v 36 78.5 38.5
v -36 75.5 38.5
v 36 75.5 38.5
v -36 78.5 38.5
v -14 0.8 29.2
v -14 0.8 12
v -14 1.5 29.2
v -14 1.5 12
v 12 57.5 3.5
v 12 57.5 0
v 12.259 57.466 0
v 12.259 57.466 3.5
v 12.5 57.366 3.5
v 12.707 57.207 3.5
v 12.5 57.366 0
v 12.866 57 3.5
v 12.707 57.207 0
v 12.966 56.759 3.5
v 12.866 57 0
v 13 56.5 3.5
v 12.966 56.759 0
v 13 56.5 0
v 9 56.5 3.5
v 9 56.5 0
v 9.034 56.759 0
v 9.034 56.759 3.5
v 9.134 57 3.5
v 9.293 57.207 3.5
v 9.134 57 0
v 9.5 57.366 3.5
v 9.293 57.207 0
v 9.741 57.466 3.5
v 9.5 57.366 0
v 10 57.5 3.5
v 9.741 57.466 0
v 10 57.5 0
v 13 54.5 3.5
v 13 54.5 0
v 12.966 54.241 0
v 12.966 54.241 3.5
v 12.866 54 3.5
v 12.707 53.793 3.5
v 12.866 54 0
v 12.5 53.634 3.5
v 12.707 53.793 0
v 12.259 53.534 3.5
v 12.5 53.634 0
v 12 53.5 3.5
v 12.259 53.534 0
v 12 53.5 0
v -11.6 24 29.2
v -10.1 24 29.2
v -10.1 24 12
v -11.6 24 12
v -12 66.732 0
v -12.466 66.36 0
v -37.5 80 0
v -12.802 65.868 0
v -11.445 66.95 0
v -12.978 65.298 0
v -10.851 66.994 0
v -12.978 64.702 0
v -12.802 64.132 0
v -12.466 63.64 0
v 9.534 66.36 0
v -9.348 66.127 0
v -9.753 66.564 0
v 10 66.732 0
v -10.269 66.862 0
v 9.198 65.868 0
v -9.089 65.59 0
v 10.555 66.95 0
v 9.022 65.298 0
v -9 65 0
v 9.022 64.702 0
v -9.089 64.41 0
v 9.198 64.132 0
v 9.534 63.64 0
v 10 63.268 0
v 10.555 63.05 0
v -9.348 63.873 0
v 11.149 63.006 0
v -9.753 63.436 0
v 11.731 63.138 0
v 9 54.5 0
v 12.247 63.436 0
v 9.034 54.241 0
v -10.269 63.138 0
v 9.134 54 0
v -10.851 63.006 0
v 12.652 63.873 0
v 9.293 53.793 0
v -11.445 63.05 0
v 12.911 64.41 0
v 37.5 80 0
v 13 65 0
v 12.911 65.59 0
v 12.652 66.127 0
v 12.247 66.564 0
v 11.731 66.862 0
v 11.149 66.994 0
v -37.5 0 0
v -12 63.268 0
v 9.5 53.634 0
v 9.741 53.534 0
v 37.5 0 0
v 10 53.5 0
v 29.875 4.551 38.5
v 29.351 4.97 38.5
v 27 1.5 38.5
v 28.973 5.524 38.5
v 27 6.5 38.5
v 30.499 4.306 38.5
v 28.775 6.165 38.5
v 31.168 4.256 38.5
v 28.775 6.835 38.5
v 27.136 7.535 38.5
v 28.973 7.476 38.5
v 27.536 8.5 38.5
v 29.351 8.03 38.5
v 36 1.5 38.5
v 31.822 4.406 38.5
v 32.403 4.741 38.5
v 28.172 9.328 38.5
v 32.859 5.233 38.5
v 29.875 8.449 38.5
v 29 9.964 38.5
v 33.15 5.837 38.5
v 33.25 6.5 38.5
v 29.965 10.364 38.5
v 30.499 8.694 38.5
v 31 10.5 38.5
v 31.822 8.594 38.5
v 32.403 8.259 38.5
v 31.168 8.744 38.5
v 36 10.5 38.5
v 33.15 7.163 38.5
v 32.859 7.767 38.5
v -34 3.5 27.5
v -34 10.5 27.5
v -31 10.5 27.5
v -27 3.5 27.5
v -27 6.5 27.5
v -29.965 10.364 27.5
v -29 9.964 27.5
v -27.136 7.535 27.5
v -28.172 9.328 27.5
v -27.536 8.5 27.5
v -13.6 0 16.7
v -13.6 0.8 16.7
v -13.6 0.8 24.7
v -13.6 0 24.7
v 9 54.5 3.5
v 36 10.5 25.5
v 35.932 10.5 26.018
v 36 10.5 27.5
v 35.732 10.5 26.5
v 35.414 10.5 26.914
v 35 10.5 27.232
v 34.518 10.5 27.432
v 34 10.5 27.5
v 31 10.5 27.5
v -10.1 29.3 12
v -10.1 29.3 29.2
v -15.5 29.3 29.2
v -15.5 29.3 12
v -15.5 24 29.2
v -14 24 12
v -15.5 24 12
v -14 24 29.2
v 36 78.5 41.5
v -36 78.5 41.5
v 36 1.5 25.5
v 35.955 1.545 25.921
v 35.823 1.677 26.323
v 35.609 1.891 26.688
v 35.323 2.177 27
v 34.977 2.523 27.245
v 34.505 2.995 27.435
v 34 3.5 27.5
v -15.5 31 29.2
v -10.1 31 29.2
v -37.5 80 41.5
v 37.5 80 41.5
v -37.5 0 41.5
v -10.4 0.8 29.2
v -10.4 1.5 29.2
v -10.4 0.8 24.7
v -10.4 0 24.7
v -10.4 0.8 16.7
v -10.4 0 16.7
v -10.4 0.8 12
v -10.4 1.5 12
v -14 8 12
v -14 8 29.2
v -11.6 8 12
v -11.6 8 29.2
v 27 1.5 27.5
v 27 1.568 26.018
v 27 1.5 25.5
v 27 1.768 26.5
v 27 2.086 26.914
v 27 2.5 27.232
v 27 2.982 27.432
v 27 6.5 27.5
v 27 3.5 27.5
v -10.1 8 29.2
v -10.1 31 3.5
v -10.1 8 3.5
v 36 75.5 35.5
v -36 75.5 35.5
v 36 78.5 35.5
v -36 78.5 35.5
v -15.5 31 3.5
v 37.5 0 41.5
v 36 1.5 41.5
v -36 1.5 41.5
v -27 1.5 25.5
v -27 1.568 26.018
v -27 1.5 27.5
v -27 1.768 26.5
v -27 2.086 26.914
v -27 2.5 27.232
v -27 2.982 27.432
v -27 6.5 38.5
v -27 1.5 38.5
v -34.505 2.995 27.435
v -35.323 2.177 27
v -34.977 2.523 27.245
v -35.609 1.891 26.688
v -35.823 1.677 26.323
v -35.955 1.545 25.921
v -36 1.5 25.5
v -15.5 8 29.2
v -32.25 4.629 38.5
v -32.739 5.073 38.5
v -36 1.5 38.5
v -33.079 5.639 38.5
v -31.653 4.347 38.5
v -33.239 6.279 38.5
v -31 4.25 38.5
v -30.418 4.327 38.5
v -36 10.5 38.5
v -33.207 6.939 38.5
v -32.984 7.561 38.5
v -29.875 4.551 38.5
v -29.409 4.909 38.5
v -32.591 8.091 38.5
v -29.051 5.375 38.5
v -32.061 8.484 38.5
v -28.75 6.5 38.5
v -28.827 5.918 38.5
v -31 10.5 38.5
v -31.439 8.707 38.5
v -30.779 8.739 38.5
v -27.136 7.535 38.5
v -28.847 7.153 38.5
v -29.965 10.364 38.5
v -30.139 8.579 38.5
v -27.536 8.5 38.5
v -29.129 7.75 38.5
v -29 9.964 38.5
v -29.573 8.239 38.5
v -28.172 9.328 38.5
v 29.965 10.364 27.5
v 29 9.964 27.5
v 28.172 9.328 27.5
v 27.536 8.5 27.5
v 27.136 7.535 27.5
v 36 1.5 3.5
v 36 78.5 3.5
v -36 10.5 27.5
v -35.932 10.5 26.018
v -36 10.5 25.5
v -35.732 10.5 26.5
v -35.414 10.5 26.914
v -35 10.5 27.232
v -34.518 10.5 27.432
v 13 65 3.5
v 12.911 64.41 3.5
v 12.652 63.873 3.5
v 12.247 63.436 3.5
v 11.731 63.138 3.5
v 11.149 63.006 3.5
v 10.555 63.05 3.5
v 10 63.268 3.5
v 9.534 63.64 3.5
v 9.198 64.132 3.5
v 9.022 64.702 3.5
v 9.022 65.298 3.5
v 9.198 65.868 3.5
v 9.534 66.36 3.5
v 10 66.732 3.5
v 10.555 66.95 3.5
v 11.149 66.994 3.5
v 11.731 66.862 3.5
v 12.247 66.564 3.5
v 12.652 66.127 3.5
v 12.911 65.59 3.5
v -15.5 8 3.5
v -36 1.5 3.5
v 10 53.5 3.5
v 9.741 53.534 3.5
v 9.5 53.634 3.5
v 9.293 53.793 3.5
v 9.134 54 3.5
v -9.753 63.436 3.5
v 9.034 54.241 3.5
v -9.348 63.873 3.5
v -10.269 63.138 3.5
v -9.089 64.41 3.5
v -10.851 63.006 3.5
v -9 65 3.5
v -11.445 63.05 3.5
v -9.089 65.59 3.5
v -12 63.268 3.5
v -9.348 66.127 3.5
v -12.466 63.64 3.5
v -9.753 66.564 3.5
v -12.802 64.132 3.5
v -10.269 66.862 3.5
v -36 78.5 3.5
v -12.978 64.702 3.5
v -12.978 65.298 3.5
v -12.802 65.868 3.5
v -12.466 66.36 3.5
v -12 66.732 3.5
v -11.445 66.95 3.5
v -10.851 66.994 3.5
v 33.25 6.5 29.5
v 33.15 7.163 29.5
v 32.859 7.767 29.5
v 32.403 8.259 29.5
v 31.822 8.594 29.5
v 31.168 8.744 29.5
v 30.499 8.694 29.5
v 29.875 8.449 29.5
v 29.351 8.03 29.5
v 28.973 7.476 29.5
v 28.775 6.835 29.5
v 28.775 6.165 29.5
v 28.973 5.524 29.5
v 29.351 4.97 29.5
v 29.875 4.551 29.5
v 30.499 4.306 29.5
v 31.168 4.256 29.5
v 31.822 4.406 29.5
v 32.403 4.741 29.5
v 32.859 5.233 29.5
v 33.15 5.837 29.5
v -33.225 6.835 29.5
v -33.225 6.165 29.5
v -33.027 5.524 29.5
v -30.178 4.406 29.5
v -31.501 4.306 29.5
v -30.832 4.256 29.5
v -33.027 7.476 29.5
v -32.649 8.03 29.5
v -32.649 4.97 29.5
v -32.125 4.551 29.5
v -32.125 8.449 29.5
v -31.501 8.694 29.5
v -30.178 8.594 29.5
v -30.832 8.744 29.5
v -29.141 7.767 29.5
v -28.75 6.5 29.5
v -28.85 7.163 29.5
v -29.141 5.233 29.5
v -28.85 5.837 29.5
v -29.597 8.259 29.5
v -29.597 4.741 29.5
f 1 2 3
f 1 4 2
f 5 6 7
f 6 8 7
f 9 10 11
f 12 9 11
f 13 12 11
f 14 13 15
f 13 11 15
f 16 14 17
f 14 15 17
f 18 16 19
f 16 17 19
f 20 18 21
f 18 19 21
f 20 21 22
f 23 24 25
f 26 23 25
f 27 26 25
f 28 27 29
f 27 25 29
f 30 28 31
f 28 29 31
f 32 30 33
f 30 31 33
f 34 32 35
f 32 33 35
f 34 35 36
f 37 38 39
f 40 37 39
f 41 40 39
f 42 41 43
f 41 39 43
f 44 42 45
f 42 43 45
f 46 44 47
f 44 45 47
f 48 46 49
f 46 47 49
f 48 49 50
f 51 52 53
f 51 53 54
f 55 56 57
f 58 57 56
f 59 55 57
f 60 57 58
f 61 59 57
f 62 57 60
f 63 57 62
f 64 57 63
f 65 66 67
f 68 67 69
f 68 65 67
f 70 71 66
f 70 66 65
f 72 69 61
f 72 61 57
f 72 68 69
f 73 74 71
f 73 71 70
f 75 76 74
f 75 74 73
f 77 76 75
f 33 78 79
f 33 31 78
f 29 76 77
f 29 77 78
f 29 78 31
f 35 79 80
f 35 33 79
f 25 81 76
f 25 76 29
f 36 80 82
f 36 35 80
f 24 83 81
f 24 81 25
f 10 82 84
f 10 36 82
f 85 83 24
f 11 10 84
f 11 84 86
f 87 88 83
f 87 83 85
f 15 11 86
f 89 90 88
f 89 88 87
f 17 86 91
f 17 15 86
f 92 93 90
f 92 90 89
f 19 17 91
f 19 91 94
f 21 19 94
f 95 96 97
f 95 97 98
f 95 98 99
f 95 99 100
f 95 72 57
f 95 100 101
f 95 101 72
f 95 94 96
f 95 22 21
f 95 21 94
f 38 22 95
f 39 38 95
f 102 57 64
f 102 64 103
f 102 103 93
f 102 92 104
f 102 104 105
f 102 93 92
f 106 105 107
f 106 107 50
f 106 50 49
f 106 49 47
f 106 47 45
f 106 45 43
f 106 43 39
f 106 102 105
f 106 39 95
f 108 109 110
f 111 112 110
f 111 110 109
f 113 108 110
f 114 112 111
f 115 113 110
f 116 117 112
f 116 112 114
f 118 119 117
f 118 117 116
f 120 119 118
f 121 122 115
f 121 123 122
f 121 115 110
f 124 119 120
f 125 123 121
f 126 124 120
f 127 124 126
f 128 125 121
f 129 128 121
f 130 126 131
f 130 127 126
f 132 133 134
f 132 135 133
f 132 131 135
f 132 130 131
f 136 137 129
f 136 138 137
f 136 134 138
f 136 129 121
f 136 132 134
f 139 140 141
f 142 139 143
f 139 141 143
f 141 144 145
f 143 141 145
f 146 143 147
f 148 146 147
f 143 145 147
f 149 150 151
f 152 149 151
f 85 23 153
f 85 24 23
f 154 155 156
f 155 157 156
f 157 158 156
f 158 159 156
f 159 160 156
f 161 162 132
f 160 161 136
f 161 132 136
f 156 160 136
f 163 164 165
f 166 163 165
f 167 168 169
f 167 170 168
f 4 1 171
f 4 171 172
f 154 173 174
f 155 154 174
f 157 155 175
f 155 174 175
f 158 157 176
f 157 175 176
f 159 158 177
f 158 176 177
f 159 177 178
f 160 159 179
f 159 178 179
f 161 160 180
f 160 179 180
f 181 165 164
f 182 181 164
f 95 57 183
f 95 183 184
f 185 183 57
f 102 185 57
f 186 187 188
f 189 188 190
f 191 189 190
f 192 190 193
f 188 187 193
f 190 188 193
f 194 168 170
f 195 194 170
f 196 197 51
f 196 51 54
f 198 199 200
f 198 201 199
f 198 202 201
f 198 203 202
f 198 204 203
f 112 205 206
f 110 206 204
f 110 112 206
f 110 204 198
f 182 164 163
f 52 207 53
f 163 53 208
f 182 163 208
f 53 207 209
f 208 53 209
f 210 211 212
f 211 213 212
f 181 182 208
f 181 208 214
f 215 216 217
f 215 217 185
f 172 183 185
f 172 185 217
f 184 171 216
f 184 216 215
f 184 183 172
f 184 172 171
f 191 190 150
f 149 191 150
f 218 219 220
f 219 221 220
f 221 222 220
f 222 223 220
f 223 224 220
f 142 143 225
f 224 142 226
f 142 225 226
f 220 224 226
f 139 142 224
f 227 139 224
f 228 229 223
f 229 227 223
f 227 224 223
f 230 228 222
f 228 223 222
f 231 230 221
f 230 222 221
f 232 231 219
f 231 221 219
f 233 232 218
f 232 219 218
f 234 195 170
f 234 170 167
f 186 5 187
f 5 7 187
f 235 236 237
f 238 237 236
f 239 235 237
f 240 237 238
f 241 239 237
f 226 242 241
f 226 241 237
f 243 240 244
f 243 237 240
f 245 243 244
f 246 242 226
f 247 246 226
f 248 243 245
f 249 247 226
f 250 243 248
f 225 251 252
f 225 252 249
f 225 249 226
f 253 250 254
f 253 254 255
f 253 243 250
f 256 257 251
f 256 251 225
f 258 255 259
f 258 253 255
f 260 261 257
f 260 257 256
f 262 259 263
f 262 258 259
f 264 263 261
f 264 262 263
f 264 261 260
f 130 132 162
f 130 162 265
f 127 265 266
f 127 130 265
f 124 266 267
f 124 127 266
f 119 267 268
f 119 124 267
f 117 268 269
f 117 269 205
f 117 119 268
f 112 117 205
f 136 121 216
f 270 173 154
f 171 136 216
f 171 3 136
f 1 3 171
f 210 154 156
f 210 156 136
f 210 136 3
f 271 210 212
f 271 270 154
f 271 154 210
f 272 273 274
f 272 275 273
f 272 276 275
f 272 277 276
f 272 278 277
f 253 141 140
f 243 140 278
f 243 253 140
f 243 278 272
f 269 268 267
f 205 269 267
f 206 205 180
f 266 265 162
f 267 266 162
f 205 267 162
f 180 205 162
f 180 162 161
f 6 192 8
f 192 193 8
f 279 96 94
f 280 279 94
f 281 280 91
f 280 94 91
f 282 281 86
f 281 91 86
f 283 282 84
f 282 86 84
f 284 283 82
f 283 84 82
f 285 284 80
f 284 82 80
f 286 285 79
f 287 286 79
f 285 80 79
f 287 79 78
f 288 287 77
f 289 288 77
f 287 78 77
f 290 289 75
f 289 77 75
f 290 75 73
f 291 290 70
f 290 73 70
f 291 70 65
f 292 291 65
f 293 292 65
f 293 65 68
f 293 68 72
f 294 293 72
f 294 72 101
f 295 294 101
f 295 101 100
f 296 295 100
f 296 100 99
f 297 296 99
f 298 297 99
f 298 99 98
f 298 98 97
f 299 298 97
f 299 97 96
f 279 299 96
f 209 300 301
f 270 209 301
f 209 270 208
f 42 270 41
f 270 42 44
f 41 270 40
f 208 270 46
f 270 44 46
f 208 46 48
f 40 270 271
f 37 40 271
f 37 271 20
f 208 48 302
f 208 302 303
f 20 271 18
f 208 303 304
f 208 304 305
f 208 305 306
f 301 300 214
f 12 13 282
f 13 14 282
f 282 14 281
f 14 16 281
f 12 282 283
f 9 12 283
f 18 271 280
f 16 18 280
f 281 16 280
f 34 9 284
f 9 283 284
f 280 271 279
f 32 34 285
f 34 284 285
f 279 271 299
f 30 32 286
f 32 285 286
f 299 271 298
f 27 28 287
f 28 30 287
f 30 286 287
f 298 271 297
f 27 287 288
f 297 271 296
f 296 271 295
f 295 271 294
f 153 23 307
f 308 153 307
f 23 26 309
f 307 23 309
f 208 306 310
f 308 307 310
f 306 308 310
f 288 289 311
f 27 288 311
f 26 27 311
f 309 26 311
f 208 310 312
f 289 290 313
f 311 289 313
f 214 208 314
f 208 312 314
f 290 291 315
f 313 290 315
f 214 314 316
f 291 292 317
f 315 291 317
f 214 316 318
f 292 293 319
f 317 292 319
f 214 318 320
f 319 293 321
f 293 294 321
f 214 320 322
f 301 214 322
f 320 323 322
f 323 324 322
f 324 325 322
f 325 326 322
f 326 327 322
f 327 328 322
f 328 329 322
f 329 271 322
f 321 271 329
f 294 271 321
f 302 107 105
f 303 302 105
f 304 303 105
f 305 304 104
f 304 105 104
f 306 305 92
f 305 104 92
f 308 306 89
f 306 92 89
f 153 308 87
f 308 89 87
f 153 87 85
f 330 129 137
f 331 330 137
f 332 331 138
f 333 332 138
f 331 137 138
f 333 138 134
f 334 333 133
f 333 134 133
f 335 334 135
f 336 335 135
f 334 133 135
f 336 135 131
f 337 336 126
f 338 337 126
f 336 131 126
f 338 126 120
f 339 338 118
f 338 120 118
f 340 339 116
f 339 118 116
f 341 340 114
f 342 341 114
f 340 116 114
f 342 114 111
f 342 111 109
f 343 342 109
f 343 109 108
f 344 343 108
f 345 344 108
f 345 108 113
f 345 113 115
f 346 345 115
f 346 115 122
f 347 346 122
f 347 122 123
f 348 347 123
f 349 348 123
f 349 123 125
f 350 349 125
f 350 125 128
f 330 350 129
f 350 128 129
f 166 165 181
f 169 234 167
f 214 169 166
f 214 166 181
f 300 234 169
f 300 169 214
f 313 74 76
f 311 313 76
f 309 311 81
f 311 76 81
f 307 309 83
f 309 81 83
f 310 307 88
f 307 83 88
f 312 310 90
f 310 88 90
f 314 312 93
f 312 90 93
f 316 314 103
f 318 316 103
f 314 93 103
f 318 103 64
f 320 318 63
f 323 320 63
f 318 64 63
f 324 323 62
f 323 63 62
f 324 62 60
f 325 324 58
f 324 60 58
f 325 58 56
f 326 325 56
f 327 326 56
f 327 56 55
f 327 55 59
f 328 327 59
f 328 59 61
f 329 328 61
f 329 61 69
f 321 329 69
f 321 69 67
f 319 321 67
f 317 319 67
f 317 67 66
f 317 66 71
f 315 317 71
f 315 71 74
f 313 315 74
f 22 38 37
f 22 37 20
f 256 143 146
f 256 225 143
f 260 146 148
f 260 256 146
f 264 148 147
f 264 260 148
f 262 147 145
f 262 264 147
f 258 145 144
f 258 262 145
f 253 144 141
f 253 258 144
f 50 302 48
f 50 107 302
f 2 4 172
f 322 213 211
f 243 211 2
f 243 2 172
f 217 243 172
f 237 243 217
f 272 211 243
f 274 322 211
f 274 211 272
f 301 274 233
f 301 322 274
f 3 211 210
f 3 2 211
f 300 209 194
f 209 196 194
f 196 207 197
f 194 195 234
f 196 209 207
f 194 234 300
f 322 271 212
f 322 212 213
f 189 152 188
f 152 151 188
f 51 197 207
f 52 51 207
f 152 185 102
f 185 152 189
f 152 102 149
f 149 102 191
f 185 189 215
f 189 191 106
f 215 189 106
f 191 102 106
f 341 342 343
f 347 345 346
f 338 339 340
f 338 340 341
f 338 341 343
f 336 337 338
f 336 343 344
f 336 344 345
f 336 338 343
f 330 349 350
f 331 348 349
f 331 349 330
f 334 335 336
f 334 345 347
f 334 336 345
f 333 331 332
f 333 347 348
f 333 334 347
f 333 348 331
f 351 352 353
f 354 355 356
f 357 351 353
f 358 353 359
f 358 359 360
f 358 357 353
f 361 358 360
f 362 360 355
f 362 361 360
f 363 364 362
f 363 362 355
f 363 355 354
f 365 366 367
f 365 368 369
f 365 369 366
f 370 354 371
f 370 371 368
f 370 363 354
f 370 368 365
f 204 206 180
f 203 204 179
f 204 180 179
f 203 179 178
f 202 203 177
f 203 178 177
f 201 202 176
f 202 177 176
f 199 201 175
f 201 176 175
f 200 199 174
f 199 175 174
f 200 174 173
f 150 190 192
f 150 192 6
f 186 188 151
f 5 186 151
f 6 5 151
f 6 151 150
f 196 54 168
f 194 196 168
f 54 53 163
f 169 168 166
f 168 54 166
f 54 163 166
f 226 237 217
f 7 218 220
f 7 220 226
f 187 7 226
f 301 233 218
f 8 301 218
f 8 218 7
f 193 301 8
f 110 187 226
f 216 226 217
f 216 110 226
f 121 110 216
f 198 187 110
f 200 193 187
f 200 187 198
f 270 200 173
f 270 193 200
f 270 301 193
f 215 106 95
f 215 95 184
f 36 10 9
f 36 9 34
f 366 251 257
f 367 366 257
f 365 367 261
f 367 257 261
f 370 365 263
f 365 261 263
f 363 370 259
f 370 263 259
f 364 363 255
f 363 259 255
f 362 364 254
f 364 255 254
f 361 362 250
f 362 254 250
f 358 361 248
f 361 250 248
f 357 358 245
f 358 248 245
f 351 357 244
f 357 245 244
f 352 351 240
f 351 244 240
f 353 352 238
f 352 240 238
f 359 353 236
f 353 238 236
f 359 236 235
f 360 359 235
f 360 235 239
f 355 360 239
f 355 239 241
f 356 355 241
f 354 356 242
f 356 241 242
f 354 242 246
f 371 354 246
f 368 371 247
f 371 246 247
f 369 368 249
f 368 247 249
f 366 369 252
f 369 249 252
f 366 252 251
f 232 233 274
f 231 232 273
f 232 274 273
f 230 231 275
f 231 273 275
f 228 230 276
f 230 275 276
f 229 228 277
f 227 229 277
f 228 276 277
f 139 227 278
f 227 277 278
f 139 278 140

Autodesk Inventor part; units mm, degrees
sketch "Boceto1" plane through (0, 0, 0) normal (0, 1, 0) x (-1, 0, 0)
  line L0 (0, 0) -> (0, 0)
  line L1 (0, 0) -> (37.5, 0)
  line L2 (37.5, 0) -> (37.5, -1.5)
  line L3 (37.5, -1.5) -> (37.5, -3.5)
  line L4 (37.5, -3.5) -> (37.5, -2)
  line L5 (37.5, 0) -> (37.5, 0)
  line L6 (37.5, -3.5) -> (34, -3.5)
  line L7 (34, -3.5) -> (34, -2)
  line L8 (34, -2) -> (36, -2)
  line L9 (37.5, 0) -> (37.5, 0)
  line L10 (0, 0) -> (0, -10)
  line L11 (0, 0) -> (37.5, 0)
  line L12 (37.5, 0) -> (0, 0)
  line L13 (0, 0) -> (0, 0)
  line L14 (0, 0) -> (-37.5, 0)
  line L15 (-37.5, 0) -> (-37.5, -1.5)
  line L16 (-37.5, -1.5) -> (-37.5, -3.5)
  line L17 (-37.5, -3.5) -> (-37.5, -2)
  line L18 (-37.5, 0) -> (-37.5, 0)
  line L19 (-37.5, -3.5) -> (-34, -3.5)
  line L20 (-34, -3.5) -> (-34, -2)
  line L21 (-34, -2) -> (-36, -2)
  line L22 (-37.5, 0) -> (-37.5, 0)
  line L23 (0, 0) -> (-37.5, 0)
  line L24 (0, 0) -> (-37.5, 0)
  line L25 (37.5, 0) -> (-37.5, 0)
  line L26 (-37.5, 0) -> (-37.5, 2)
  line L27 (-37.5, 2) -> (37.5, 2)
  line L28 (37.5, 2) -> (37.5, 0)
  dimension "d0" = 0
  dimension "d1" = 37.5
  dimension "d3" = 1.5
  dimension "d4" = 2
  dimension "d5" = 1.5
  dimension "d6" = 3.5
  dimension "d7" = 2
  dimension "d8" = 0
  dimension "d9" = 10
  dimension "d31" = 2
extrude "Extrusión1" [suppressed]
sketch "Boceto2" plane through (0, 0, 0) normal (0, 0, 1) x (1, 0, 0)
  line L0 (0, 0) -> (-15, 0)
  line L1 (-15, 0) -> (-15, 62.7974)
  line L2 (-15, 62.7974) -> (-12.5, 62.7974)
  line L3 (-12.5, 62.7974) -> (-15, 60.2974)
  line L4 (-12.5, 62.7974) -> (-15, 64.2408)
  line L5 (-15, 62.7974) -> (-15, 64.2408)
  line L6 (-15, 62.7974) -> (-15, 82.1308)
  line L7 (-15, 82.1308) -> (-13, 85.5949)
  line L8 (-15, 82.1308) -> (-15, 85.5949)
  line L9 (-15, 85.5949) -> (0, 85.5949)
  line L10 (0, 85.5949) -> (0, 0)
  line L11 (-15, 62.7974) -> (-15, 43.4641)
  line L12 (-15, 43.4641) -> (-13, 40)
  line L13 (-13, 40) -> (-13, 0)
  line L14 (0, 0) -> (15, 0)
  line L15 (15, 0) -> (15, 62.7974)
  line L16 (15, 62.7974) -> (12.5, 62.7974)
  line L17 (12.5, 62.7974) -> (15, 60.2974)
  line L18 (12.5, 62.7974) -> (15, 64.2408)
  line L19 (15, 62.7974) -> (15, 64.2408)
  line L20 (15, 62.7974) -> (15, 82.1308)
  line L21 (15, 82.1308) -> (13, 85.5949)
  line L22 (15, 82.1308) -> (15, 85.5949)
  line L23 (15, 85.5949) -> (0, 85.5949)
  line L24 (15, 62.7974) -> (15, 43.4641)
  line L25 (15, 43.4641) -> (13, 40)
  line L26 (13, 40) -> (13, 0)
  dimension "d12" = 15
  dimension "d13" = 60
  dimension "d14" = 45
  dimension "d15" = 2.5
  dimension "d16" = 62.7974
  dimension "d17" = 15
  dimension "d18" = 30
  dimension "d19" = 19.3333
  dimension "d20" = 19.3333
  dimension "d21" = 150
  dimension "d22" = 2
  dimension "d24" = 2
extrude "Extrusión2" [suppressed]
extrude "Extrusión4" [suppressed]
extrude "Extrusión3" [suppressed]
extrude "Extrusión5" add sketch "Boceto1" along normal blind 80
sketch "Boceto3" plane through (-37.5, 0, 2) normal (0, 0, 1) x (1, 0, 0)
  line L0 (0, 0) -> (0, 80) projected
  line L1 (0, 0) -> (0, 80)
  line L2 (0, 80) -> (75, 80)
  line L3 (75, 80) -> (75, 0)
  line L4 (0, 0) -> (75, 0) projected
  line L5 (75, 0) -> (0, 0)
  line L6 (73.5, 1.5) -> (73.5, 78.5)
  line L7 (73.5, 78.5) -> (1.5, 78.5)
  line L8 (1.5, 78.5) -> (1.5, 1.5)
  line L9 (1.5, 1.5) -> (73.5, 1.5)
  dimension "d135" = 1.5
  dimension "d136" = 1.5
  dimension "d137" = 1.5
  dimension "d138" = 1.5
  dimension "d139" = 72
  dimension "d140" = 77
extrude "Extrusión6" add sketch "Boceto3" along normal blind 39.5
ref_plane "Plano de trabajo1" through (0, 80, 0) normal (0, 1, 0) x (1, 0, 0)
sketch "Boceto4" plane through (0, 80, 0) normal (0, 1, 0) x (1, 0, 0)
  line L0 (0, 0) -> (0, -2)
  line L1 (-37.5, -2) -> (37.5, -2) projected
  line L2 (0, -2) -> (37.5, -2)
  line L3 (0, -2) -> (-37.5, -2)
  line L4 (37.5, -2) -> (37.5, -3.5)
  line L5 (37.5, -3.5) -> (-37.5, -3.5)
  line L6 (-37.5, -3.5) -> (-37.5, -2)
  dimension "d48" = 2
  dimension "d49" = 37.5
  dimension "d50" = 37.5
  dimension "d51" = 1.5
extrude "Extrusión7" add sketch "Boceto4" against normal blind 80
ref_plane "Plano de trabajo2" through (-36, 78.5, 38.5) normal (0, 0, 1) x (1, 0, 0)
sketch "Boceto5" plane through (-36, 78.5, 38.5) normal (0, 0, 1) x (1, 0, 0)
  line L0 (0, 0) -> (72, 0) projected
  line L1 (0, 0) -> (0, -3)
  line L2 (-1.5, -78.5) -> (-1.5, 1.5) projected
  line L3 (0, -3) -> (72, -3)
  line L4 (72, -3) -> (72, 0)
  line L5 (0, -77) -> (0, 0) projected
  line L6 (72, 0) -> (0, 0)
  dimension "d144" = 3
  dimension "d145" = 72
extrude "Extrusión8" add sketch "Boceto5" against normal blind 3
ref_plane "Plano de trabajo3" through (0, 0, 0) normal (0, 1, 0) x (1, 0, 0)
sketch "Boceto6" plane through (0, 0, 0) normal (0, 1, 0) x (1, 0, 0)
  line L0 (0, 0) -> (0, -3.5)
  line L1 (0, -3.5) -> (0, -38.5)
  line L2 (-36, -38.5) -> (36, -38.5)
  line L3 (-36, -38.5) -> (-36, -33.5)
  line L4 (36, -38.5) -> (36, -33.5)
  line L5 (-36, -33.5) -> (-31, -33.5)
  line L6 (36, -33.5) -> (31, -33.5)
  circle A0 centre (-31, -33.5) radius 4
  circle A1 centre (31, -33.5) radius 4
  line L7 (-31, -29.5) -> (-36, -29.5)
  line L8 (-36, -29.5) -> (-36, -33.5)
  line L9 (-27.1194, -32.5299) -> (-27.1194, -38.5)
  line L10 (27.1194, -32.5299) -> (27.1194, -38.5)
  line L11 (31, -29.5) -> (36, -29.5)
  line L12 (36, -29.5) -> (36, -33.5)
  circle A2 centre (-31, -33.5) radius 2
  circle A3 centre (31, -33.5) radius 2
  point P0 (-27.5, -82)
  point P1 (27.5, -82)
  point P2 (27.5, -2)
  dimension "d74" = 35
  dimension "d75" = 72
  dimension "d76" = 36
  dimension "d77" = 5
  dimension "d79" = 5
  dimension "d80" = 5
  dimension "d81" = 5
  dimension "d82" = 8
  dimension "d83" = 8
  dimension "d84" = 3.5
  dimension "d85" = 0
  dimension "d88" = 4
  dimension "d89" = 4
sketch "Boceto8" plane through (0, 0, 0) normal (0, 0, 1) x (1, 0, 0)
  line L0 (0, 0) -> (0, 65)
  line L1 (0, 65) -> (-11, 65)
  circle A0 centre (-11, 65) radius 2
  line L2 (0, 65) -> (11, 65)
  circle A1 centre (11, 65) radius 2
  circle A2 centre (11, 65) radius 4
  circle A3 centre (-11, 65) radius 4
  line L3 (0, 0) -> (15, 0)
  line L4 (37.5, 0) -> (-37.5, 0) projected
  line L5 (15, 0) -> (13, 0)
  line L6 (13, 0) -> (13, 0)
  line L7 (13, 0) -> (13, 1.5)
  line L8 (13, 1.5) -> (13, 53.5)
  line L9 (13, 54.5) -> (13, 56.5)
  line L10 (12, 57.5) -> (10, 57.5)
  line L11 (9, 56.5) -> (9, 54.5)
  line L12 (10, 53.5) -> (12, 53.5)
  arc A4 (13, 56.5) -> (12, 57.5) centre (12, 56.5) ccw
  arc A5 (12, 53.5) -> (13, 54.5) centre (12, 54.5) ccw
  arc A6 (9, 54.5) -> (10, 53.5) centre (10, 54.5) ccw
  arc A7 (10, 57.5) -> (9, 56.5) centre (10, 56.5) ccw
  line L13 (37.5, 80) -> (-37.5, 80) projected
  point P0 (13, 57.5)
  point P1 (9, 57.5)
  dimension "d90" = 11
  dimension "d91" = 4
  dimension "d92" = 11
  dimension "d93" = 4
  dimension "d94" = 65
  dimension "d95" = 8
  dimension "d96" = 8
  dimension "d97" = 15
  dimension "d98" = 2
  dimension "d99" = 0
  dimension "d100" = 1.5
  dimension "d102" = 4
  dimension "d103" = 4
  dimension "d104" = 1
  dimension "d107" = 2
  dimension "d108" = 13
  dimension "d110" = 22.5
  dimension "d134" = 7.5
extrude "Extrusión12" cut sketch "Boceto8" along normal blind 10 contours A0 | A1 | A5 L12 A6 L11 A7 L10 A4 L9
sketch "Boceto9" plane through (-36, 79, 3.5) normal (0, -1, 0) x (1, 0, 0)
  line L0 (0, -1.5) -> (0, 0) projected
  line L1 (0, 0) -> (36, 0)
  line L2 (36, 0) -> (36, 52)
  line L3 (23.5, 59) -> (48.5, 59)
  line L4 (48.5, 59) -> (48.5, 45)
  line L5 (48.5, 45) -> (23.5, 45)
  line L6 (23.5, 45) -> (23.5, 59)
  line L7 (23.5, 59) -> (48.5, 45) construction
  line L8 (48.5, 59) -> (23.5, 45) construction
  line L9 (23.5, 64.4) -> (48.5, 64.4)
  line L10 (48.5, 64.4) -> (48.5, 37.4)
  line L11 (48.5, 37.4) -> (23.5, 37.4)
  line L12 (23.5, 37.4) -> (23.5, 64.4)
  line L13 (23.5, 64.4) -> (23.5, 61.9)
  line L14 (23.5, 61.9) -> (26, 61.9)
  line L15 (48.5, 64.4) -> (48.5, 61.9)
  line L16 (48.5, 61.9) -> (46, 61.9)
  circle A0 centre (26, 61.9) radius 1.5
  circle A1 centre (46, 61.9) radius 1.5
  line L17 (23.5, 37.4) -> (26, 37.4)
  line L18 (26, 37.4) -> (26, 39.9)
  line L19 (48.5, 37.4) -> (46, 37.4)
  line L20 (46, 37.4) -> (46, 39.9)
  circle A2 centre (26, 39.9) radius 1.5
  circle A3 centre (46, 39.9) radius 1.5
  point P0 (36, -3.5)
  dimension "d111" = 36
  dimension "d112" = 52
  dimension "d113" = 25
  dimension "d114" = 14
  dimension "d115" = 27
  dimension "d116" = 5.4
  dimension "d117" = 2.5
  dimension "d118" = 2.5
  dimension "d119" = 2.5
  dimension "d120" = 2.5
  dimension "d121" = 3
  dimension "d122" = 3
  dimension "d123" = 2.5
  dimension "d124" = 2.5
  dimension "d125" = 2.5
  dimension "d126" = 2.5
  dimension "d127" = 3
  dimension "d128" = 3
extrude "Extrusión13" [suppressed]
extrude "Extrusión14" [suppressed]
sketch "Boceto11" plane through (-36, 78.5, 38.5) normal (0, 0, 1) x (1, 0, 0)
  line L0 (0, -77) -> (0, 0) projected
  line L1 (0, 0) -> (0, -77)
  line L2 (0, -77) -> (5, -77)
  line L3 (5, -77) -> (5, -72)
  line L4 (0, -77) -> (72, -77)
  line L5 (72, -77) -> (72, -72)
  line L6 (72, -72) -> (67, -72)
  circle A0 centre (67, -72) radius 4
  circle A1 centre (5, -72) radius 4
  line L7 (5, -68) -> (0, -68)
  line L8 (9, -72) -> (9, -77)
  circle A2 centre (5, -72) radius 2.25
  circle A3 centre (67, -72) radius 2.25
  line L9 (67, -68) -> (72, -68)
  line L10 (72, -68) -> (72, -72)
  line L11 (63, -72) -> (63, -77)
  point P0 (0, -68)
  point P1 (5, -77)
  dimension "d146" = 77
  dimension "d147" = 5
  dimension "d148" = 5
  dimension "d149" = 72
  dimension "d150" = 5
  dimension "d151" = 5
  dimension "d152" = 8
  dimension "d153" = 8
  dimension "d154" = 4.5
  dimension "d155" = 4.5
extrude "Extrusión15" add sketch "Boceto11" against normal blind 11 contours L11 A0 L6 L5 L4 | L0 L7 A1 L3 L2 | L3 A1 L8 L4 | A2 | A1 | A3 | A0 | L6 A0 L9 L10
extrude "Extrusión16" cut sketch "Boceto11" against normal blind 9 contours A2 | A3
ref_plane "Plano de trabajo4" through (0, 1.5, 0) normal (0, 1, 0) x (-1, 0, 0)
sketch "Boceto12" plane through (0, 1.5, 0) normal (0, 1, 0) x (-1, 0, 0)
  line L0 (0, 0) -> (0, 3.5)
  line L1 (0, 3.5) -> (14, 3.5)
  line L2 (-36, 3.5) -> (36, 3.5) projected
  line L3 (14, 3.5) -> (14, 12)
  line L4 (14, 12) -> (14, 29.2)
  line L5 (14, 29.2) -> (10.4, 29.2)
  line L6 (10.4, 29.2) -> (10.4, 20.7)
  line L7 (10.4, 20.7) -> (10.4, 16.7)
  line L8 (10.4, 16.7) -> (13.6, 16.7)
  line L9 (13.6, 16.7) -> (13.6, 24.7)
  line L10 (13.6, 24.7) -> (10.4, 24.7)
  line L11 (14, 29.2) -> (15.5, 29.2)
  line L12 (15.5, 29.2) -> (15.5, 3.5)
  line L13 (15.5, 3.5) -> (14, 3.5)
  line L14 (10.4, 16.7) -> (10.4, 12)
  line L15 (10.4, 12) -> (14, 12)
  line L16 (14, 29.2) -> (11.6, 29.2)
  line L17 (11.6, 29.2) -> (11.6, 12)
  line L18 (11.6, 29.2) -> (10.1, 29.2)
  line L19 (10.1, 29.2) -> (10.1, 3.5)
  line L20 (36, 3.5) -> (-36, 3.5) projected
  line L21 (10.4, 12) -> (10.1, 12)
  line L22 (14, 12) -> (15.5, 12)
  point P0 (10.1, 3.5)
  dimension "d161" = 3.5
  dimension "d162" = 14
  dimension "d163" = 8.5
  dimension "d164" = 17.2
  dimension "d165" = 3.6
  dimension "d166" = 8.5
  dimension "d167" = 4
  dimension "d168" = 3.2
  dimension "d169" = 8
  dimension "d171" = 1.5
  dimension "d176" = 2.4
  dimension "d177" = 1.5
extrude "Extrusión21" add sketch "Boceto12" along normal blind 29.5
extrude "Extrusión17" cut sketch "Boceto12" against normal blind 1.5 contours L7 L6 L10 L17 L8 | L17 L10 L9 L8
extrude "Extrusión18" cut sketch "Boceto12" against normal blind 0.7 contours L15 L17 L8 L9 L10 L5 L4 | L14 L8 L17 L15 | L5 L17 L10 L6
extrude "Extrusión22" cut sketch "Boceto12" along normal blind 27.8 contours L19 L18 L6 L7 L14 L21 | L15 L17 L8 L9 L10 L5 L4 | L4 L11 L12 L22 | L14 L8 L17 L15 | L5 L17 L10 L6 | L7 L6 L10 L17 L8 | L17 L10 L9 L8
extrude "Extrusión19" add sketch "Boceto12" along normal blind 22.5 contours L19 L21 L15 L3 L1 | L3 L22 L12 L2 | L19 L18 L6 L7 L14 L21 | L4 L11 L12 L22 | L14 L8 L17 L15 | L5 L17 L10 L6 | L7 L6 L10 L17 L8
extrude "Extrusión20" cut sketch "Boceto12" along normal blind 6.5 contours L19 L21 L15 L3 L1 | L3 L22 L12 L2 | L19 L18 L6 L7 L14 L21 | L4 L11 L12 L22 | L14 L8 L17 L15 | L5 L17 L10 L6 | L7 L6 L10 L17 L8
fillet "Empalme1" radius 2 4 edges at (36, 6, 27.5) (31.5, 1.5, 27.5) (-31.5, 1.5, 27.5) (-36, 6, 27.5)
equation "\"d0\" = 0 * thikness_box"
equation "\"d1\" = 0.5 * box_in_width + thikness_box"
equation "\"d3\" = sfbox_width"
equation "\"d4\" = fat_width_slider"
equation "\"d5\" = slim_width_slider"
equation "\"d6\" = ext_width_slider"
equation "\"d7\" = int_width_slider"
equation "\"d8\" = 0 * thikness_box"
equation "\"d31\" = thikness"
equation "\"d10\" = box_slim_slider_lenght"
equation "\"d12\" = 0.5 * box_base_width"
equation "\"d13\" = sfbox_theta1"
equation "\"d14\" = sfbox_theta2"
equation "\"d15\" = sfbox_tip_width"
equation "\"d17\" = 0.5 * box_base_width"
equation "\"d19\" = 0.5 * sf_flex_separation"
equation "\"d20\" = 0.5 * sf_flex_separation"
equation "\"d22\" = int_width_slider"
equation "\"d24\" = int_width_slider"
equation "\"d25\" = offset_base_box"
equation "\"d27\" = sfbox_width"
equation "\"d49\" = 0.5 * box_in_width + thikness_box"
equation "\"d50\" = 0.5 * box_in_width + thikness_box"
equation "\"d51\" = thikness_box"
equation "\"d74\" = box_in_height"
equation "\"d75\" = box_in_width"
equation "\"d76\" = 0.5 * d75"
equation "\"d77\" = offset + 0.5 * screw_Dhead"
equation "\"d79\" = offset + 0.5 * screw_Dhead"
equation "\"d80\" = d77"
equation "\"d81\" = d79"
equation "\"d82\" = screw_Dhead"
equation "\"d83\" = screw_Dhead"
equation "\"d84\" = d31 + d51"
equation "\"d88\" = screw_d"
equation "\"d89\" = screw_d"
equation "\"d91\" = screw_d"
equation "\"d93\" = screw_d"
equation "\"d95\" = screw_Dhead"
equation "\"d96\" = screw_Dhead"
equation "\"d97\" = 0.5 * box_base_width"
equation "\"d99\" = d32 - 2 * thikness_box - box_in_deep"
equation "\"d100\" = thikness_box"
equation "\"d111\" = 0.5 * box_in_width"
equation "\"d113\" = width_screen"
equation "\"d114\" = height_screen"
equation "\"d115\" = height_screen_total"
equation "\"d116\" = top_from_screen"
equation "\"d117\" = offset_screw_screen + 0.5 * screw_d_screen"
equation "\"d118\" = offset_screw_screen + 0.5 * screw_d_screen"
equation "\"d119\" = offset_screw_screen + 0.5 * screw_d_screen"
equation "\"d120\" = offset_screw_screen + 0.5 * screw_d_screen"
equation "\"d121\" = screw_d_screen"
equation "\"d122\" = screw_d_screen"
equation "\"d123\" = offset_screw_screen + 0.5 * screw_d_screen"
equation "\"d124\" = offset_screw_screen + 0.5 * screw_d_screen"
equation "\"d125\" = offset_screw_screen + 0.5 * screw_d_screen"
equation "\"d126\" = offset_screw_screen + 0.5 * screw_d_screen"
equation "\"d127\" = screw_d_screen"
equation "\"d128\" = screw_d_screen"
equation "\"d131\" = deep_screw_screen"
equation "\"thikness\" = 2"
equation "\"offset\" = 1"
equation "\"screw_Dhead\" = 8"
equation "\"screw_d\" = 4"
equation "\"box_in_deep\" = 77"
equation "\"box_in_width\" = 72"
equation "\"box_in_height\" = 35"
equation "\"thikness_box\" = 1.5"
equation "\"offset_base_box\" = 40"
equation "\"box_slim_slider_lenght\" = 116"
equation "\"sf_flex_separation\" = 38.66667"
equation "\"flex_separation_theta\" = 60deg"
equation "\"int_width_slider\" = 2"
equation "\"ext_width_slider\" = 3.5"
equation "\"fat_width_slider\" = 2"
equation "\"slim_width_slider\" = 1.5"
equation "\"sfbox_width\" = 1.5"
equation "\"sfbox_tip_width\" = 2.5"
equation "\"sfbox_theta1\" = 60deg"
equation "\"sfbox_theta2\" = 45deg"
equation "\"width_screen\" = 25"
equation "\"height_screen\" = 14"
equation "\"screw_d_screen\" = 3"
equation "\"offset_screw_screen\" = 1"
equation "\"height_screen_total\" = 27"
equation "\"top_from_screen\" = 5.4"
equation "\"deep_screw_screen\" = 1.5"
equation "\"r1\" = 5.55"
equation "\"r2o\" = 59.75"
equation "\"delta_y\" = 6"
equation "\"wire_d\" = 1"
equation "\"width_ang_spring\" = 5"
equation "\"spring_int_diam\" = 8.5"
equation "\"spring_ext_diam\" = 10.5"
equation "\"r3\" = 8.25"
equation "\"r3R\" = 4.75"
equation "\"r3T\" = 6.74537"
equation "\"alpha\" = 54.847297deg"
equation "\"alpha2\" = 270deg"
equation "\"theta3_recogido\" = 305.152703deg"
equation "\"delta_theta_3\" = 45deg"
equation "\"joint_width\" = 12"
equation "\"joint_radius\" = 7.75"
equation "\"shaft_width\" = 15"
equation "\"shaft_joint_diameter\" = 7.75"
equation "\"separation_space\" = 0.5"
equation "\"height_finger\" = 42"
equation "\"cell_screw_head_diameter\" = 4"
equation "\"cell_screw_diameter\" = 2"
equation "\"cell_space\" = 2"
equation "\"cell_width\" = 6"
equation "\"cell_theta_position\" = 60deg"
equation "\"cell_thikness\" = 1"
equation "\"cell_lenght\" = 37"
equation "\"cell_z_space\" = 5"
equation "\"wire_D\" = 2.3"
equation "\"width_link\" = 8"
equation "\"Dt\" = 1.05949"
equation "\"Djoint_shaft\" = 2.3"
equation "\"shaft_x\" = 1.45"
equation "\"shaft_y\" = 6.45"
equation "\"lenght_body_link\" = 186.05"
equation "\"lenght_bar_support\" = 201.65"
equation "\"wire_spring_d\" = 1"
equation "\"spring_int_d\" = 6"
equation "\"spring_lenght\" = 28"
equation "\"trigger_offset\" = 2"
equation "\"m2_theta2o\" = 107deg"
equation "\"m2_r2\" = 28"
equation "\"e\" = 9"
equation "\"So\" = 17"
equation "\"m2_theta3o\" = -30deg"
equation "\"m2_r3\" = 19.75"
equation "\"m2_delta_theta1\" = 15deg"
equation "\"m2_theta3f\" = -60deg"
equation "\"trigger_thumb_lenght\" = 6"
equation "\"width_r12\" = 8"
equation "\"m2_r1\" = 25.2"
equation "\"r3_thikness\" = 3.5"
equation "\"t_thikness\" = 3"
equation "\"tg_width\" = 4"
equation "\"pivot_screw_d\" = 4"
equation "\"pivot_diameter\" = 7"
equation "\"sj_diam_shaft\" = 6"
equation "\"sj_groove\" = 2"
equation "\"sj_groove_deep\" = 7"
equation "\"sj_head_D\" = 7"
equation "\"sj_head_d\" = 4.7464"
equation "\"sj_head_height\" = 5"
equation "\"sf_lenght\" = 9.5"
equation "\"sf_base\" = 3"
equation "\"sf_head_height\" = 3"
equation "\"sf_head_width\" = 4.5"
equation "\"sf_head_offset\" = 0.25"
equation "\"sf_head_grip_width\" = 2"
equation "\"sf_head_angle\" = 45deg"
equation "\"sf_thikness\" = 5"
equation "\"screw_lenght\" = 12"
equation "\"screwJ_base_D\" = 9"
equation "\"screwJ_top_D\" = 13"
equation "\"gj_D\" = 6"
equation "\"gj_d\" = 4"
equation "\"gj_out_section\" = 6"
equation "\"box_fat_slider_lenght\" = 67"
equation "\"agarradera_theta\" = 60deg"
equation "\"agarradera_width\" = 4"
equation "\"agarradera_position\" = 82.13077"
equation "\"placa_width\" = 17"
equation "\"pin_width\" = 7.6"
equation "\"pin_thikness\" = 3"
equation "\"pin_out_section\" = 1"
equation "\"placa_thikness\" = 2.4"
equation "\"pin_deep\" = 6"
equation "\"placa_pin_thikness\" = 3.4"
equation "\"placa_deep\" = 27.8"
equation "\"box_base_width\" = 30"
equation "\"d32\" = 80"
properties part number "Caja"
